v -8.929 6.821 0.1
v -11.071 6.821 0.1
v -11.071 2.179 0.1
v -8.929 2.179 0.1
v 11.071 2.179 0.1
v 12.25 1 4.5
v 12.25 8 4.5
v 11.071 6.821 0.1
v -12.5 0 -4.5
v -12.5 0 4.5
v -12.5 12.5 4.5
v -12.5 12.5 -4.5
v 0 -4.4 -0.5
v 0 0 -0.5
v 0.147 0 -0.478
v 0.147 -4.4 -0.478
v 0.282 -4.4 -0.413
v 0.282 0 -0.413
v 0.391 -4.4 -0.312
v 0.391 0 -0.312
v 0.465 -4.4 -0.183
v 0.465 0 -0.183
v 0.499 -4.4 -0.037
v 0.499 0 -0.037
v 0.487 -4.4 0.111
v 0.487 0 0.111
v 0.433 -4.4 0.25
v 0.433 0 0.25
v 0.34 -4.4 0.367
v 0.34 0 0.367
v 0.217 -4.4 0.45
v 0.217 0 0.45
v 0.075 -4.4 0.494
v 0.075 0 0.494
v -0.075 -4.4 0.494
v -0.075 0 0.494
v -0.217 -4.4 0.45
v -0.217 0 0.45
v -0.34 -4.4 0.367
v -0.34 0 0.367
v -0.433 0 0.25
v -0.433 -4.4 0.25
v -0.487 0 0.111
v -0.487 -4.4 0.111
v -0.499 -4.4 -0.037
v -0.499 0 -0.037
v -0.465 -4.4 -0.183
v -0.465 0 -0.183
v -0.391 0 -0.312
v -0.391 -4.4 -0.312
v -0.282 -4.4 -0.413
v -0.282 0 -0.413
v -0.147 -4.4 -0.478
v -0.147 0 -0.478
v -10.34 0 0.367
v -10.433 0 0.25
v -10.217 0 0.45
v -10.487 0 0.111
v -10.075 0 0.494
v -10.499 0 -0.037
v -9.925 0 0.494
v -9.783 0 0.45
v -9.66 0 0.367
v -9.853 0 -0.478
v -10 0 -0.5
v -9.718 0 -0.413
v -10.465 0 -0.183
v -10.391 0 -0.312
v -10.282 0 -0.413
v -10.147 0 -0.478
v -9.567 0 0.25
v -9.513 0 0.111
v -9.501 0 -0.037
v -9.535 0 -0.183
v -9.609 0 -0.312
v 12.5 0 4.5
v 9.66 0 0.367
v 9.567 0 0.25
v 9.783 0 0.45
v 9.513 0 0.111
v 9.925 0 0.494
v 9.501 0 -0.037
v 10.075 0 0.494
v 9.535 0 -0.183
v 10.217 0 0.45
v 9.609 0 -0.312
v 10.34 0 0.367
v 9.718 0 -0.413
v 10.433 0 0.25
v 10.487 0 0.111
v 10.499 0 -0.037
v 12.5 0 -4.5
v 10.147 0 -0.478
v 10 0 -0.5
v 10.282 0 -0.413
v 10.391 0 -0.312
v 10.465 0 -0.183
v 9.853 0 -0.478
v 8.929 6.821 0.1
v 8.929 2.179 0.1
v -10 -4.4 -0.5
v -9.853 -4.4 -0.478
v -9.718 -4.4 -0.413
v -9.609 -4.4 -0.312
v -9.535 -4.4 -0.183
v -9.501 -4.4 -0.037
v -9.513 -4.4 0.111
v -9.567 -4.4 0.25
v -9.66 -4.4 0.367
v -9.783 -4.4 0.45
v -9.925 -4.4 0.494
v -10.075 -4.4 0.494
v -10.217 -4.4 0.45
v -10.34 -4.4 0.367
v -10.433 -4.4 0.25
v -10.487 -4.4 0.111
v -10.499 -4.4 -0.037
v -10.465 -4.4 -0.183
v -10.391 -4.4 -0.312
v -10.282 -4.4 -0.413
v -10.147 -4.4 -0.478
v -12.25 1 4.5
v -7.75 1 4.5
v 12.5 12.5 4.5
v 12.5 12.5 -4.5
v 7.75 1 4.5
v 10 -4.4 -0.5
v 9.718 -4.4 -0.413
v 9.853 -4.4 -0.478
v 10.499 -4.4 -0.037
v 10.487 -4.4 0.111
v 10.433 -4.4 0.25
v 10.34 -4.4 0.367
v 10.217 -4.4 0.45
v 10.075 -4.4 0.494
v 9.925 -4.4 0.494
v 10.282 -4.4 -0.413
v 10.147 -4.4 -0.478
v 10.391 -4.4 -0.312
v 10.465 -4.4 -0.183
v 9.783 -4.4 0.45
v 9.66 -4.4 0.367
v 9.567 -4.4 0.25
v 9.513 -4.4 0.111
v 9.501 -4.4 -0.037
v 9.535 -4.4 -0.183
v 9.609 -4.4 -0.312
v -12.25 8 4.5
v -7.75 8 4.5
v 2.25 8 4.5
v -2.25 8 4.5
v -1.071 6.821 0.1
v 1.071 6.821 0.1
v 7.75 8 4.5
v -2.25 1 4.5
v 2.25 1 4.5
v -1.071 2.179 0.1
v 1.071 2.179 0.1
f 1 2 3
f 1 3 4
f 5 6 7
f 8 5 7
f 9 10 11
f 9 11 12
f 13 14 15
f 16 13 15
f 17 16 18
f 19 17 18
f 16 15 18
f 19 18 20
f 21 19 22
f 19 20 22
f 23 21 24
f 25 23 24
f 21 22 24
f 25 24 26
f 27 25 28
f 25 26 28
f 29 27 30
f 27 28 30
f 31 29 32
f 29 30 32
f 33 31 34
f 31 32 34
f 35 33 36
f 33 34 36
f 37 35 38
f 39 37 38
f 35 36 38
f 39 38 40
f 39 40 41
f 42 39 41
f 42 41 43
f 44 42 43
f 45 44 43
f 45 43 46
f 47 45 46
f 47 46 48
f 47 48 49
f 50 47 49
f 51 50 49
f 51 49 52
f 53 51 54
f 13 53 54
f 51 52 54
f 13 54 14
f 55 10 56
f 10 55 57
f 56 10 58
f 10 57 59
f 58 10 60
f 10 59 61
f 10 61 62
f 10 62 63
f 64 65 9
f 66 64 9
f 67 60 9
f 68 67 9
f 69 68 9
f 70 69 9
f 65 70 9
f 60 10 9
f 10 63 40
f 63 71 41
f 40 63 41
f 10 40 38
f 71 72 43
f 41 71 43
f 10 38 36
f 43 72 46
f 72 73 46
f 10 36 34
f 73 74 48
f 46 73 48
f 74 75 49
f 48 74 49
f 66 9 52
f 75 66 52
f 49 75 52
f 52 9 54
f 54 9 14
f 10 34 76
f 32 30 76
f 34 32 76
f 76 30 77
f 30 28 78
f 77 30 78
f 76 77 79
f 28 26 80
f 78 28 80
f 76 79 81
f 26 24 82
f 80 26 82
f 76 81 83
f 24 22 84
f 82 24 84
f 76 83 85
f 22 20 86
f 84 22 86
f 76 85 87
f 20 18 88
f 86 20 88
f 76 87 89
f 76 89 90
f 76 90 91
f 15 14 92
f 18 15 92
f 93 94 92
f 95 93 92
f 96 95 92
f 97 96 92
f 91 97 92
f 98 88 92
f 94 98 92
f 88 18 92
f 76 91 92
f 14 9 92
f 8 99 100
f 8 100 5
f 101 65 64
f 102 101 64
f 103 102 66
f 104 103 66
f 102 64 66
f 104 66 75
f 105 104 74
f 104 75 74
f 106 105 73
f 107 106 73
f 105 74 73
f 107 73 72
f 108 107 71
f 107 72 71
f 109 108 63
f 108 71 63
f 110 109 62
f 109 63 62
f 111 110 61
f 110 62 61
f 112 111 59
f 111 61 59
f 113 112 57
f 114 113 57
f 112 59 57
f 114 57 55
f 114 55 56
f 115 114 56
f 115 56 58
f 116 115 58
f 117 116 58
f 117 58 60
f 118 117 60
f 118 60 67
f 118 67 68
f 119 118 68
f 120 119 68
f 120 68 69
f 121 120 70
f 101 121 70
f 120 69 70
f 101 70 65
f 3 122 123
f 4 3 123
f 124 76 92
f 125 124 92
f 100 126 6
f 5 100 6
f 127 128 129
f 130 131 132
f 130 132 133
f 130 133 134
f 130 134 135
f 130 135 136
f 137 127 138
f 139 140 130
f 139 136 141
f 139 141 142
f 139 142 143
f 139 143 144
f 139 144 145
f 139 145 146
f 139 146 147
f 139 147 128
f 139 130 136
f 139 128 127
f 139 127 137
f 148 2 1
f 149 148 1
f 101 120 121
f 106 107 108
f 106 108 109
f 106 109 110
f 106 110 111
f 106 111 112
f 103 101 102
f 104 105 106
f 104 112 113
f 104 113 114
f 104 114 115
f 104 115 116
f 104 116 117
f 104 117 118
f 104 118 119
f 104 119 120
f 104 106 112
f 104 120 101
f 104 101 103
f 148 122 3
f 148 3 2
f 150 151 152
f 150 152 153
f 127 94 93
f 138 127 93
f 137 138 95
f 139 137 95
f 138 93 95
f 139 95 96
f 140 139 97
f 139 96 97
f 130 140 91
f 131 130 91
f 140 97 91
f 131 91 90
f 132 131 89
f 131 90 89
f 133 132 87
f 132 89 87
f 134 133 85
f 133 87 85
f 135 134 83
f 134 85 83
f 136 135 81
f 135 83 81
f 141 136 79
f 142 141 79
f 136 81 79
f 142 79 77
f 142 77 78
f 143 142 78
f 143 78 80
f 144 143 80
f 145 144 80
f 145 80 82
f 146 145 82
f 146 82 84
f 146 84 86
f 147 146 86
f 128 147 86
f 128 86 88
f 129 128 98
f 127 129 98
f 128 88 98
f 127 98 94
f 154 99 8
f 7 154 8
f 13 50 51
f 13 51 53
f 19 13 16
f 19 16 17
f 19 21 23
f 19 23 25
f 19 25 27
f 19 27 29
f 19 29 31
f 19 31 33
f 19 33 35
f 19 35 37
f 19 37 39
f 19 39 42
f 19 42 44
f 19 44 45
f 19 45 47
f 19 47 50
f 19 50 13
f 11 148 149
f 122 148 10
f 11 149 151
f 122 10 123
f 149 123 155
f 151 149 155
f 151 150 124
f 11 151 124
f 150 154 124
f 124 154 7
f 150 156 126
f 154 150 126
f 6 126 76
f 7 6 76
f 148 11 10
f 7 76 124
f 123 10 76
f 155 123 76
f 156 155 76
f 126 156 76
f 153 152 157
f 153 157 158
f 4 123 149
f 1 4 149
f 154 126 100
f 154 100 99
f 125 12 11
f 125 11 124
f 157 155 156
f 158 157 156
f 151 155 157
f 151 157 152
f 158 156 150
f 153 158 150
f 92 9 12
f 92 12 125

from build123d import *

# Parameters (mm, degrees)
SKETCH1_W                    = 25
SKETCH1_H                    = 9
BOSS_EXTRUDE1_DEPTH          = 12.5
SKETCH2_R                    = 0.5
BOSS_EXTRUDE2_DEPTH          = 4.4
SKETCH3_W                    = 4.5
SKETCH3_H                    = 7
CUT_EXTRUDE1_DEPTH           = 4.4
CUT_EXTRUDE1_DRAFT           = -15
CUT_EXTRUDE1_PROFILE_2_DEPTH = 4.4
CUT_EXTRUDE1_PROFILE_2_DRAFT = -15
CUT_EXTRUDE1_PROFILE_3_DEPTH = 4.4
CUT_EXTRUDE1_PROFILE_3_DRAFT = -15


with BuildPart() as part:
    # Sketch1 → Boss-Extrude1 (new body)
    with BuildSketch(Plane(origin=(0, 0, 0), x_dir=(1, 0, 0), z_dir=(0, 1, 0))):
        Rectangle(SKETCH1_W, SKETCH1_H)
    extrude(amount=BOSS_EXTRUDE1_DEPTH)

    # Sketch2 → Boss-Extrude2 (add)
    with BuildSketch(Plane.XZ):
        with Locations(Location((0, 0, 0), (0, 0, 270))):
            Circle(SKETCH2_R)
        with Locations(Location((-10, 0, 0), (0, 0, 270))):
            Circle(SKETCH2_R)
        with Locations(Location((10, 0, 0), (0, 0, 270))):
            Circle(SKETCH2_R)
    extrude(amount=BOSS_EXTRUDE2_DEPTH)


with BuildPart() as cut_extrude1_tool:
    # Sketch3 → Cut-Extrude1 (with draft: the straight prism first)
    with BuildSketch(Plane.XY.offset(4.5)):
        with Locations((0, 4.5)):
            Rectangle(SKETCH3_W, SKETCH3_H)
    extrude(amount=-CUT_EXTRUDE1_DEPTH)
    # Cut-Extrude1: the draft: its side faces are tilted about the plane it starts from
    cut_extrude1_sides = [cut_extrude1_tool.faces().sort_by_distance(p)[0] for p in [
        (0, 1, 2.3),
        (2.25, 4.5, 2.3),
        (0, 8, 2.3),
        (-2.25, 4.5, 2.3),
    ]]
    draft(cut_extrude1_sides, Plane.XY.offset(4.5), CUT_EXTRUDE1_DRAFT)


with BuildPart() as part_1:
    add(part.part)

    # Cut-Extrude1: cut by cut_extrude1_tool
    add(cut_extrude1_tool.part, mode=Mode.SUBTRACT)


with BuildPart() as cut_extrude1_profile_2_tool:
    # Sketch3 → Cut-Extrude1 profile 2 (with draft: the straight prism first)
    with BuildSketch(Plane.XY.offset(4.5)):
        with Locations((10, 4.5)):
            Rectangle(SKETCH3_W, SKETCH3_H)
    extrude(amount=-CUT_EXTRUDE1_PROFILE_2_DEPTH)
    # Cut-Extrude1 profile 2: the draft: its side faces are tilted about the plane it starts from
    cut_extrude1_profile_2_sides = [cut_extrude1_profile_2_tool.faces().sort_by_distance(p)[0] for p in [
        (10, 1, 2.3),
        (12.25, 4.5, 2.3),
        (10, 8, 2.3),
        (7.75, 4.5, 2.3),
    ]]
    draft(cut_extrude1_profile_2_sides, Plane.XY.offset(4.5), CUT_EXTRUDE1_PROFILE_2_DRAFT)


with BuildPart() as part_2:
    add(part_1.part)

    # Cut-Extrude1 profile 2: cut by cut_extrude1_profile_2_tool
    add(cut_extrude1_profile_2_tool.part, mode=Mode.SUBTRACT)


with BuildPart() as cut_extrude1_profile_3_tool:
    # Sketch3 → Cut-Extrude1 profile 3 (with draft: the straight prism first)
    with BuildSketch(Plane.XY.offset(4.5)):
        with Locations((-10, 4.5)):
            Rectangle(SKETCH3_W, SKETCH3_H)
    extrude(amount=-CUT_EXTRUDE1_PROFILE_3_DEPTH)
    # Cut-Extrude1 profile 3: the draft: its side faces are tilted about the plane it starts from
    cut_extrude1_profile_3_sides = [cut_extrude1_profile_3_tool.faces().sort_by_distance(p)[0] for p in [
        (-10, 1, 2.3),
        (-7.75, 4.5, 2.3),
        (-10, 8, 2.3),
        (-12.25, 4.5, 2.3),
    ]]
    draft(cut_extrude1_profile_3_sides, Plane.XY.offset(4.5), CUT_EXTRUDE1_PROFILE_3_DRAFT)


with BuildPart() as part_3:
    add(part_2.part)

    # Cut-Extrude1 profile 3: cut by cut_extrude1_profile_3_tool
    add(cut_extrude1_profile_3_tool.part, mode=Mode.SUBTRACT)


solid = part_3.part
